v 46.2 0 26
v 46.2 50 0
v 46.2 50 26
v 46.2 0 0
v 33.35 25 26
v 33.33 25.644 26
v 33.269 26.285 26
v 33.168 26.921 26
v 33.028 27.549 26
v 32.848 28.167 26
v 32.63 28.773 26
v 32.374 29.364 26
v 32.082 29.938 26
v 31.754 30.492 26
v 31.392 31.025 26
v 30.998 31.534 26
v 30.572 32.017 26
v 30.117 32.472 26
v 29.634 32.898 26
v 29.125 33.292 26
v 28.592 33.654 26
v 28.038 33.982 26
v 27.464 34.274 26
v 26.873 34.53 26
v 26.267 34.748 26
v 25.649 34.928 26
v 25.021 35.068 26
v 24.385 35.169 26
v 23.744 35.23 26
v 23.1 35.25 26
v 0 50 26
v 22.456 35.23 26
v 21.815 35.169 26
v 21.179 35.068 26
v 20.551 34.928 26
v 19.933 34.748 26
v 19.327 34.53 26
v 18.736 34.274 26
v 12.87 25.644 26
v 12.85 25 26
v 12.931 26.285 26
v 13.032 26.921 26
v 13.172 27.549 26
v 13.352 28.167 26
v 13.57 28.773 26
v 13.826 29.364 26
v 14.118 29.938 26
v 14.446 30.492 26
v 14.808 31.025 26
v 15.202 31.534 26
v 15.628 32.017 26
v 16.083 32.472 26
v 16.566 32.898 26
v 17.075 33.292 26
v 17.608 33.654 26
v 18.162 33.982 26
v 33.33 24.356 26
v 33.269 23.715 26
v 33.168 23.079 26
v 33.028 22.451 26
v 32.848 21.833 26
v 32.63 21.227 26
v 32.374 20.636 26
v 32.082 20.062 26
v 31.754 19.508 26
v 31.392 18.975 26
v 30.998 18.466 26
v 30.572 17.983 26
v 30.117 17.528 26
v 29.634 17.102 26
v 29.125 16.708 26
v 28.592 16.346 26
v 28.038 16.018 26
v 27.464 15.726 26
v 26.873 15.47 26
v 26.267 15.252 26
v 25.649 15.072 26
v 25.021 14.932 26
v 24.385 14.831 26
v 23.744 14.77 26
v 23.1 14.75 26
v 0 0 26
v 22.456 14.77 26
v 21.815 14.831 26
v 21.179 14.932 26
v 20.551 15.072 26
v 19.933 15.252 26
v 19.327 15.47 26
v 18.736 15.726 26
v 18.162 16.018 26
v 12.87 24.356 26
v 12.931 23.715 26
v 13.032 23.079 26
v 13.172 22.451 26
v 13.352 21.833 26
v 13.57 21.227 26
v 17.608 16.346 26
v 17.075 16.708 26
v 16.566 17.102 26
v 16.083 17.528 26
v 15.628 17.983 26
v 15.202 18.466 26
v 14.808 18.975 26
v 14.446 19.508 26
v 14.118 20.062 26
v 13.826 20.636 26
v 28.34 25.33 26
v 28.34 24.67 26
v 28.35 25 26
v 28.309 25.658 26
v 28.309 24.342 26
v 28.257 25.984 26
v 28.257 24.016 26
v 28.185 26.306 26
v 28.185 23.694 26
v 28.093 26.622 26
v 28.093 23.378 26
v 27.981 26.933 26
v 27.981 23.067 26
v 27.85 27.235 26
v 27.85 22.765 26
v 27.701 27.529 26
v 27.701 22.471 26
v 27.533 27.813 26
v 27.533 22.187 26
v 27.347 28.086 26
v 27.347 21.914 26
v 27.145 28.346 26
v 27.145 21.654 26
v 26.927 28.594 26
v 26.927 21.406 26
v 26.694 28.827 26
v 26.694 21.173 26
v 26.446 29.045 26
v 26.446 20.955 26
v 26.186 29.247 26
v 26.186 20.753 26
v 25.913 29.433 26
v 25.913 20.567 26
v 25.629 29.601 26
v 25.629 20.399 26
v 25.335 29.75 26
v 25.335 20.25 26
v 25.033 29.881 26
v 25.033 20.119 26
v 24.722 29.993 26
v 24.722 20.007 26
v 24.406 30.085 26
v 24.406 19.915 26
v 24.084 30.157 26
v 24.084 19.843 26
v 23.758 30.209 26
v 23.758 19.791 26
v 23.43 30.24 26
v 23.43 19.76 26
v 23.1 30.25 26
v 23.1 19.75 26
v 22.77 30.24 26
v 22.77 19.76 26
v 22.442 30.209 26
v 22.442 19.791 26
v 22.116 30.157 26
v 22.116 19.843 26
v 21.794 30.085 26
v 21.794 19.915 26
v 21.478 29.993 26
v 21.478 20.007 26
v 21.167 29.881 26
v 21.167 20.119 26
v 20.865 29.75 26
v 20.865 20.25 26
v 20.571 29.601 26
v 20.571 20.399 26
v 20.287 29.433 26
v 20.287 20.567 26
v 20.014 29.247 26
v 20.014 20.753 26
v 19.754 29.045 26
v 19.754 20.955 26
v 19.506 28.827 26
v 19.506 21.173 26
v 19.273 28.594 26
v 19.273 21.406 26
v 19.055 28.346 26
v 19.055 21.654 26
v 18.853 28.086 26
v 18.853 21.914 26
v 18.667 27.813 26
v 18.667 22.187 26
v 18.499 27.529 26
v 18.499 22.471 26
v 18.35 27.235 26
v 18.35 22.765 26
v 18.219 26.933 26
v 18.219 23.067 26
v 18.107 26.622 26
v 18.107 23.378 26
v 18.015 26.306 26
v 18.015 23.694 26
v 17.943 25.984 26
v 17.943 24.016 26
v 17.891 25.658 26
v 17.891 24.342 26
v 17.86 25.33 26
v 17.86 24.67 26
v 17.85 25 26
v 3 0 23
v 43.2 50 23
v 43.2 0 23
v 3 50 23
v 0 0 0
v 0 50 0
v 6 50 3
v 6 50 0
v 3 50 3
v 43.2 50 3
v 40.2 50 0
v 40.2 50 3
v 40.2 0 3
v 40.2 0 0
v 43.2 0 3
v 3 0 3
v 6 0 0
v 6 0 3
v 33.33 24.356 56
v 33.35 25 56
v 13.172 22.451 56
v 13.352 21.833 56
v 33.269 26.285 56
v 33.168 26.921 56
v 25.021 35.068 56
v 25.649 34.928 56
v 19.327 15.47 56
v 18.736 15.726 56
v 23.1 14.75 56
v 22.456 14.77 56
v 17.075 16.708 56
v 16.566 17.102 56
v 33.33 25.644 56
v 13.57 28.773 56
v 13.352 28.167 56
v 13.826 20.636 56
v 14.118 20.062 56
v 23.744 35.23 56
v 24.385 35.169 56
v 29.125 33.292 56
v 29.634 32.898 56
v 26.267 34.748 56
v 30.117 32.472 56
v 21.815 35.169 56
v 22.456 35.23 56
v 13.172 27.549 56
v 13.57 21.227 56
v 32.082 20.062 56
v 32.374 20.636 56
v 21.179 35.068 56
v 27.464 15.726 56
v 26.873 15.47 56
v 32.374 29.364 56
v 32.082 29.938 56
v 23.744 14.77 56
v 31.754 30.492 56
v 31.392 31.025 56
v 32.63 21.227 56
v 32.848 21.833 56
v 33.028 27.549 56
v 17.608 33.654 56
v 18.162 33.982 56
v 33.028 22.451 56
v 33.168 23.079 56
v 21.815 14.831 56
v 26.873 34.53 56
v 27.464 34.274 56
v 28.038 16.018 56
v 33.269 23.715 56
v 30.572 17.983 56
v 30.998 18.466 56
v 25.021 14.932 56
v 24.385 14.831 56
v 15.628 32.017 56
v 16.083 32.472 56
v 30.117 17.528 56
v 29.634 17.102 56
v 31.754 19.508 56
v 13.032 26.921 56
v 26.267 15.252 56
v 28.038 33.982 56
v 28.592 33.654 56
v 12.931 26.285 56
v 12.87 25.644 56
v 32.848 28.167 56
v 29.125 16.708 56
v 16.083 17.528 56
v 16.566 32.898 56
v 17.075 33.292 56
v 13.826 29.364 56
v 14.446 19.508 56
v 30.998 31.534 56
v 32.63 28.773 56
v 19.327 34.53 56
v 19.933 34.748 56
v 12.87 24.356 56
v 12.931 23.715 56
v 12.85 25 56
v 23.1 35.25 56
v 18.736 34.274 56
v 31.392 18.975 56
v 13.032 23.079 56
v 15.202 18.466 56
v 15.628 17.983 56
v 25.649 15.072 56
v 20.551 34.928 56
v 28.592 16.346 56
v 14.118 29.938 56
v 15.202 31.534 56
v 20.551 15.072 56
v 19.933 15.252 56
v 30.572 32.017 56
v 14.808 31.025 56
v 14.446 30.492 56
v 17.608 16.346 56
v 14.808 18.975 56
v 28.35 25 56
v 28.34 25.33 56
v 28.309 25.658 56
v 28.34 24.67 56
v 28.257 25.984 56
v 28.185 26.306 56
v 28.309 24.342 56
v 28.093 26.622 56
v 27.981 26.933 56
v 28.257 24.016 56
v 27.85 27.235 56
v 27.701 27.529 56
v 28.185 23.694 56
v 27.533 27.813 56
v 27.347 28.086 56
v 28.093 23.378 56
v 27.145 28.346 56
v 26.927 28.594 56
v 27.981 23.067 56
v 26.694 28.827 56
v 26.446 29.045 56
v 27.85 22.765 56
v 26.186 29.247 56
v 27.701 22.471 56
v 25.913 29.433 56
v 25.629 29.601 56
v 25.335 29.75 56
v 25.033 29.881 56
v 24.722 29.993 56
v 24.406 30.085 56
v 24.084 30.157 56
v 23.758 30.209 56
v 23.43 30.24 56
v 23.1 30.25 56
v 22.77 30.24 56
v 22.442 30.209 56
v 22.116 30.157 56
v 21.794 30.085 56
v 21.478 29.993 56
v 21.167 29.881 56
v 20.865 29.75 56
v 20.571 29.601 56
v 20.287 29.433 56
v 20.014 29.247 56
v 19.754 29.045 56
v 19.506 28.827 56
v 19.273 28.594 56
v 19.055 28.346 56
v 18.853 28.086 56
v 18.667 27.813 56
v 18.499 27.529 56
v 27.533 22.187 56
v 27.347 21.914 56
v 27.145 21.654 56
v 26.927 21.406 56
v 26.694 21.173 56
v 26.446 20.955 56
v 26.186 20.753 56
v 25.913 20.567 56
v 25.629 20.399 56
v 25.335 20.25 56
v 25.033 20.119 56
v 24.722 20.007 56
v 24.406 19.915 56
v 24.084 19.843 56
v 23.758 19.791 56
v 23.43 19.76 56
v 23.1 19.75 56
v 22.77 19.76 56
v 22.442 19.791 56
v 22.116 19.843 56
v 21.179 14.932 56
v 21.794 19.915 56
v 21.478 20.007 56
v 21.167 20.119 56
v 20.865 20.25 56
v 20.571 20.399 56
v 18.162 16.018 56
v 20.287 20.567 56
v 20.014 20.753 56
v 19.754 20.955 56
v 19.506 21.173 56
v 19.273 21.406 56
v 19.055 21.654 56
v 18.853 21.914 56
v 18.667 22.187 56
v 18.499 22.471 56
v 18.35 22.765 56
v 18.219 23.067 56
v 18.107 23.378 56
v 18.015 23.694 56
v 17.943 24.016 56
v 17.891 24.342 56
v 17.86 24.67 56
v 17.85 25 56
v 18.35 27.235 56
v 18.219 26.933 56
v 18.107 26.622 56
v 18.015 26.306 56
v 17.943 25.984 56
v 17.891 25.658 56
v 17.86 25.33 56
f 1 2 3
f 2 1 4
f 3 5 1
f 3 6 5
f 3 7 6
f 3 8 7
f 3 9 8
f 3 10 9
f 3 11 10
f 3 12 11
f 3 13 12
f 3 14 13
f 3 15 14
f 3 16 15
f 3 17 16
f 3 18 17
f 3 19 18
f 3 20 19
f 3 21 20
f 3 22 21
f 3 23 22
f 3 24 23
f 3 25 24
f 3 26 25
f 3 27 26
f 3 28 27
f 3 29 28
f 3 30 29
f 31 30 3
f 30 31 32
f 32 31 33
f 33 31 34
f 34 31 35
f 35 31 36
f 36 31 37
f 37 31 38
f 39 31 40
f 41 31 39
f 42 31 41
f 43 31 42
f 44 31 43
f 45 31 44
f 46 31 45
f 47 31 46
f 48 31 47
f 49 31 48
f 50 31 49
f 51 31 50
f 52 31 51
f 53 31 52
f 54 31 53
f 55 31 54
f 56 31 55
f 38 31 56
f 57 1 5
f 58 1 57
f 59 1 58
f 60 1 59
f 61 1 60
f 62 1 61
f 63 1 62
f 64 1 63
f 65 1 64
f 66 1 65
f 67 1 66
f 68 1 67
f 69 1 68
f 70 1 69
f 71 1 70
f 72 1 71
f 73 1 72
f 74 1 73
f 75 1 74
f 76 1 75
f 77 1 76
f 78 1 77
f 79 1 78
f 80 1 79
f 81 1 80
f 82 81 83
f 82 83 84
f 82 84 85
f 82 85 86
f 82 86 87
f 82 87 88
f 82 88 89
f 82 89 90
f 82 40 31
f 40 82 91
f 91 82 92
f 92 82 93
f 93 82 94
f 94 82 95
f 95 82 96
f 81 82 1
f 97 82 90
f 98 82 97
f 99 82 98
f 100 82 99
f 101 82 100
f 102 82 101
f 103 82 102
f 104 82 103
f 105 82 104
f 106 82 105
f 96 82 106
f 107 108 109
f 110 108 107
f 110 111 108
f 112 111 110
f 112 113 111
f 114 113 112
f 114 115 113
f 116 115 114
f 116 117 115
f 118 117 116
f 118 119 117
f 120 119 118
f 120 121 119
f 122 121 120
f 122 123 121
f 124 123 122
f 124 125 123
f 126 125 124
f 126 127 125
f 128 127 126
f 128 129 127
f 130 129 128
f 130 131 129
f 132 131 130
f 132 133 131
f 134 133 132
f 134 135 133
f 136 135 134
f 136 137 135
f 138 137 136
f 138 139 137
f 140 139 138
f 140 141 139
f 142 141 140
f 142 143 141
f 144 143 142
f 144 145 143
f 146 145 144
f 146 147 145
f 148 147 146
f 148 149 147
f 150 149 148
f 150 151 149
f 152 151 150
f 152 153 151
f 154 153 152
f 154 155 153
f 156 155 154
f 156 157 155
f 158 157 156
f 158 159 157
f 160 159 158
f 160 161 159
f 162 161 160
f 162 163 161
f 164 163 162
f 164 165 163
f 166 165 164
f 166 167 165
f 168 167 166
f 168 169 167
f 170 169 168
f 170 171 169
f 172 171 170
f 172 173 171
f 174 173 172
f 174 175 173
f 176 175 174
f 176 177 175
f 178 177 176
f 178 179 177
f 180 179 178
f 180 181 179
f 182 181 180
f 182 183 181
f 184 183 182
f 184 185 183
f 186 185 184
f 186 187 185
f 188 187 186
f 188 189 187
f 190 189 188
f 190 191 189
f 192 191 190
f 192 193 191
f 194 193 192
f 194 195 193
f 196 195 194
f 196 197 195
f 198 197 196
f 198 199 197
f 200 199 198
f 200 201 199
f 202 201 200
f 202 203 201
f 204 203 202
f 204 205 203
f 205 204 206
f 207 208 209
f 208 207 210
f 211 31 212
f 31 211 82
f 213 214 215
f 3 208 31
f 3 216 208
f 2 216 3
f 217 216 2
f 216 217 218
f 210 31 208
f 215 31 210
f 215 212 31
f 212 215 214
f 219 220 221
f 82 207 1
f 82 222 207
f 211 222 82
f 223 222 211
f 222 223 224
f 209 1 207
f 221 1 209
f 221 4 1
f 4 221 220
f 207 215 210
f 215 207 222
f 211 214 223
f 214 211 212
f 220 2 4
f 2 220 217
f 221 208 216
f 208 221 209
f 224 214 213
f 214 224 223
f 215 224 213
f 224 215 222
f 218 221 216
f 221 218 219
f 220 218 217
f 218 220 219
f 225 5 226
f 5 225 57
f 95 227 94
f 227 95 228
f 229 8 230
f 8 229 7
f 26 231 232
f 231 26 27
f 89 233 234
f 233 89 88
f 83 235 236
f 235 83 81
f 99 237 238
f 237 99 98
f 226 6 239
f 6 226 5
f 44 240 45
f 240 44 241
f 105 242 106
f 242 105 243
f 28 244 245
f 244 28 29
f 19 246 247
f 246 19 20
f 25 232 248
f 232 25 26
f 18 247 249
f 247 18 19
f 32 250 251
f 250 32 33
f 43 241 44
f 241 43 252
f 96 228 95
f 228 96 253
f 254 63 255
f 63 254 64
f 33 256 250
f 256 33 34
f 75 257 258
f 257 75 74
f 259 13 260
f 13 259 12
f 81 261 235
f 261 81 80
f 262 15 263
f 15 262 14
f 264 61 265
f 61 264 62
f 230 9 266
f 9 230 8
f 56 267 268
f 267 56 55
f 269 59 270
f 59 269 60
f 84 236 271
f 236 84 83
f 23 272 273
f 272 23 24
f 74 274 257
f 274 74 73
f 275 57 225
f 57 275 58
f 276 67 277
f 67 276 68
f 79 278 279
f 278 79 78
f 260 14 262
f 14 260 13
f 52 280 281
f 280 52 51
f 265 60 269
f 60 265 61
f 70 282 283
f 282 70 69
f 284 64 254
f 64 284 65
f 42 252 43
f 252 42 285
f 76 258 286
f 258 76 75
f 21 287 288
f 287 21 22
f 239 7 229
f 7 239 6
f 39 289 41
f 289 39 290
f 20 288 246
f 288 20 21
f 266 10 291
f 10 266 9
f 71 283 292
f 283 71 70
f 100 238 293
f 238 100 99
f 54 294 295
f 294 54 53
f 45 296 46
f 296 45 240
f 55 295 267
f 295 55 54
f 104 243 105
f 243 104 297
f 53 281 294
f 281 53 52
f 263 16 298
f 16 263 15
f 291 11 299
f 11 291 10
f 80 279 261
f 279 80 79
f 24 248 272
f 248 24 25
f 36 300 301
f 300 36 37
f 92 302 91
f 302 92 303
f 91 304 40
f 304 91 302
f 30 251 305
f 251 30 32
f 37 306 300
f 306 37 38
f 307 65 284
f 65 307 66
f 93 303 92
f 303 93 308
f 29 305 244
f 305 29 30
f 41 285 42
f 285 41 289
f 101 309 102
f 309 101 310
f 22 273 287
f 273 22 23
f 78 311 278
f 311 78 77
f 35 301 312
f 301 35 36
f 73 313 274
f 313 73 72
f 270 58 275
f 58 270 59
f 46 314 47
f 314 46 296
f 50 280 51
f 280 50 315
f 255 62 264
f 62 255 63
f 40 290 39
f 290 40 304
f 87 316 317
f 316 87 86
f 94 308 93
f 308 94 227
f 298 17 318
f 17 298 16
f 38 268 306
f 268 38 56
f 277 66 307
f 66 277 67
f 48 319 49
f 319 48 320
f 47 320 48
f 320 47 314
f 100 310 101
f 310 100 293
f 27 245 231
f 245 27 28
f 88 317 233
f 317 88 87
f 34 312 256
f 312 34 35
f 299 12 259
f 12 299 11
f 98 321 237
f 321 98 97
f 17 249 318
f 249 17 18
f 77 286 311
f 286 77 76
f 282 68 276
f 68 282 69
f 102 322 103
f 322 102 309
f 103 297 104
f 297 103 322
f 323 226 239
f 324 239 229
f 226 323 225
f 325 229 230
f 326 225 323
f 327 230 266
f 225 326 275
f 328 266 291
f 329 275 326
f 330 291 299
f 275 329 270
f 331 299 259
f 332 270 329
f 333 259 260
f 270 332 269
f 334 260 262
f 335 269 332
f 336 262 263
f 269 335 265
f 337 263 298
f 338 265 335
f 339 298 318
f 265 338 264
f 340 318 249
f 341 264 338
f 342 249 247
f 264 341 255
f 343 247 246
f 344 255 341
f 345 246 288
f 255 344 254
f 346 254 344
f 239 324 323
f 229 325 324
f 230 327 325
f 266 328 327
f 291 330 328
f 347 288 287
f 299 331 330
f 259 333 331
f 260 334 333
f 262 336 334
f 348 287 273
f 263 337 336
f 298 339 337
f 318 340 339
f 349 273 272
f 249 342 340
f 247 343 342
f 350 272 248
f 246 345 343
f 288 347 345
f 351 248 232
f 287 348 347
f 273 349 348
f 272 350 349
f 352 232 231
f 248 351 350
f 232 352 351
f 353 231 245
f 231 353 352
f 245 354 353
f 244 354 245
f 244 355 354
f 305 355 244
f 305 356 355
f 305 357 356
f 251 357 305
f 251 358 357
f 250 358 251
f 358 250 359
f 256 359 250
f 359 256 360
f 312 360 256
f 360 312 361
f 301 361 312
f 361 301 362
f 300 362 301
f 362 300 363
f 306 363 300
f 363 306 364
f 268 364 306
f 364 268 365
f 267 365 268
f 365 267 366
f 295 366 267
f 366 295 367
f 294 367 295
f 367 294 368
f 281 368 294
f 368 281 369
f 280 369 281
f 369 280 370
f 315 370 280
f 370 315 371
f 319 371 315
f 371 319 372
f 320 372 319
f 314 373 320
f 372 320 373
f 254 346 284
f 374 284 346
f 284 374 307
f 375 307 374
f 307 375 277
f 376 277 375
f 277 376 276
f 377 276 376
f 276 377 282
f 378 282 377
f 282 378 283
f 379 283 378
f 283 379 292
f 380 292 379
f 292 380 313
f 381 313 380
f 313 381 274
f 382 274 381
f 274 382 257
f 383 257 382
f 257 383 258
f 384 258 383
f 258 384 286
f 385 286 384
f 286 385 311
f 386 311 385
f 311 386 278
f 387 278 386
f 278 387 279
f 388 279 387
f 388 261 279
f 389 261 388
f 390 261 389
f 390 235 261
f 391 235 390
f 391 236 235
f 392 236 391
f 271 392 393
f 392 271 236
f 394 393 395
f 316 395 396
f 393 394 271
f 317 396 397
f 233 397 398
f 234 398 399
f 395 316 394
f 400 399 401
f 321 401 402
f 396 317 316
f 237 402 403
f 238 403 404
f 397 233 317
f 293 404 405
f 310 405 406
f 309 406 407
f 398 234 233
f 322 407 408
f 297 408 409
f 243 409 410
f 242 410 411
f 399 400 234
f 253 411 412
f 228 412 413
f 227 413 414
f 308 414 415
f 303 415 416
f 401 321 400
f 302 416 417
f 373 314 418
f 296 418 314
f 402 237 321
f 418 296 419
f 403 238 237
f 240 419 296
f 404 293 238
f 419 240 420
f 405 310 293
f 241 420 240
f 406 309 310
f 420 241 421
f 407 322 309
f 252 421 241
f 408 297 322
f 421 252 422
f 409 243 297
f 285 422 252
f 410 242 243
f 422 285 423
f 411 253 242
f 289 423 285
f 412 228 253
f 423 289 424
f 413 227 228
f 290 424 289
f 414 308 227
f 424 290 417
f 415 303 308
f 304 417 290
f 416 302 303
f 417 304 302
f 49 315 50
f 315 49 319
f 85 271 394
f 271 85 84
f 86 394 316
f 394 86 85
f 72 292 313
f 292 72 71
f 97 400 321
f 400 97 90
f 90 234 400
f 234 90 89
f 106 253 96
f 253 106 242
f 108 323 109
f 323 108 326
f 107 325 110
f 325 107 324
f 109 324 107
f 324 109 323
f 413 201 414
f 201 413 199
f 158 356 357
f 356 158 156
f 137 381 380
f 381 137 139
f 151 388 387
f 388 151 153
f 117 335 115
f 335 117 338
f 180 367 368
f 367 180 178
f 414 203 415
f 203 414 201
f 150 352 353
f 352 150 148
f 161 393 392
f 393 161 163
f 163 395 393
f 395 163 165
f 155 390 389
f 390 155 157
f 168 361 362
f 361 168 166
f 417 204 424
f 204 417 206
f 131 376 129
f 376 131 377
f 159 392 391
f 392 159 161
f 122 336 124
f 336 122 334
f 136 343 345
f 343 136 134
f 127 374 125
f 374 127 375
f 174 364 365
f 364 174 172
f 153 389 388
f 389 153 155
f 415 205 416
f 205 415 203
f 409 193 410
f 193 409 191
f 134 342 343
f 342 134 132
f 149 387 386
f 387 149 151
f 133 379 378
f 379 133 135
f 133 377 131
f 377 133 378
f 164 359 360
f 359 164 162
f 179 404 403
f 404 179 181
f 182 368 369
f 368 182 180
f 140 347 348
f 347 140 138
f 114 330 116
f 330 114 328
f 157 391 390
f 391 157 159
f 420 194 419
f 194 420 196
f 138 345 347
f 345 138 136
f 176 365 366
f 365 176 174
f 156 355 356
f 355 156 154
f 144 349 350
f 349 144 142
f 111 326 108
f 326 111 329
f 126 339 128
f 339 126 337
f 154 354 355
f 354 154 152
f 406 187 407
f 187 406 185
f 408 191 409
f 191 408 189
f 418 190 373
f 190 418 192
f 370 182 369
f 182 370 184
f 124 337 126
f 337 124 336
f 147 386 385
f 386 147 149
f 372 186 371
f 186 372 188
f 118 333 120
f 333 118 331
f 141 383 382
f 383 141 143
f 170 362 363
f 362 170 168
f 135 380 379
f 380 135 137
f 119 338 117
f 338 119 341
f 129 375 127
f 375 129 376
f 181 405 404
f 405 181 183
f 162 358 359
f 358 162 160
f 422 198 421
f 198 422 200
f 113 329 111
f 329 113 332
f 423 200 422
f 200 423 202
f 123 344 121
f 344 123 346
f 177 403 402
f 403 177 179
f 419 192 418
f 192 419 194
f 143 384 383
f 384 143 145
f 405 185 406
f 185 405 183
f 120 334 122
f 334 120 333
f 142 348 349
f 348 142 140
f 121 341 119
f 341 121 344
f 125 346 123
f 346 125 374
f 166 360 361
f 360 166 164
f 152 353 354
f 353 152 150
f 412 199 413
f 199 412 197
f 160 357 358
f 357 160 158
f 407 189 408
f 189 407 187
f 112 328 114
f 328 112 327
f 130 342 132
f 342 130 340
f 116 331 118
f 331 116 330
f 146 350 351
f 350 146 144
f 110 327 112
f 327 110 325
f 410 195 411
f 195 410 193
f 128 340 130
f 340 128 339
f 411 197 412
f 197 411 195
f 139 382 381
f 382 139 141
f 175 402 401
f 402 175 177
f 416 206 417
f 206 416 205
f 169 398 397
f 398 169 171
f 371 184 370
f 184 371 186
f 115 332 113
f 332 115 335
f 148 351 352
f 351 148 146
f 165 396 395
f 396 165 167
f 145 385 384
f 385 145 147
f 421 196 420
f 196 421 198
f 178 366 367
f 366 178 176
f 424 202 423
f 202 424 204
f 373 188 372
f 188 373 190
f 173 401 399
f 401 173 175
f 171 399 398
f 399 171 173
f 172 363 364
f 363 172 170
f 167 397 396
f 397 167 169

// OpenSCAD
inner_width = 40.2;     // Inner width of U
inner_height = 20;    // Inner height of U
thickness = 3;        // Wall thickness
inner_length = 3;     // Length of inward walls
total_length = 50;    // Total length of object (5cm)

cylinder_inner_diameter = 10.5;     // Inner diameter of cylinder
cylinder_wall_thickness = 5;        // Wall thickness of cylinder
cylinder_height = 30;               // Height of cylinder (3cm)

width = inner_width + 2 * thickness;  // Total outer width
height = inner_height + 2 * thickness; // Total outer height (20.5 + 2×3 = 26.5mm)

module u_gate() {
    union() {
        translate([0, 0, height - thickness])
            cube([width, total_length, thickness]);
        
        translate([0, 0, 0])
            cube([thickness, total_length, height]);
        
        translate([width - thickness, 0, 0])
            cube([thickness, total_length, height]);
        
        translate([thickness, 0, 0])
            cube([inner_length, total_length, thickness]);
        
        translate([width - thickness - inner_length, 0, 0])
            cube([inner_length, total_length, thickness]);
    }
}

u_gate();

translate([width/2, total_length/2, height])
    difference() {
        cylinder(h = cylinder_height, 
                d = cylinder_inner_diameter + 2 * cylinder_wall_thickness, 
                center = false, $fn = 100);
        
        translate([0, 0, -0.1])
            cylinder(h = cylinder_height + 0.2, 
                    d = cylinder_inner_diameter, 
                    center = false, $fn = 100);
    }
